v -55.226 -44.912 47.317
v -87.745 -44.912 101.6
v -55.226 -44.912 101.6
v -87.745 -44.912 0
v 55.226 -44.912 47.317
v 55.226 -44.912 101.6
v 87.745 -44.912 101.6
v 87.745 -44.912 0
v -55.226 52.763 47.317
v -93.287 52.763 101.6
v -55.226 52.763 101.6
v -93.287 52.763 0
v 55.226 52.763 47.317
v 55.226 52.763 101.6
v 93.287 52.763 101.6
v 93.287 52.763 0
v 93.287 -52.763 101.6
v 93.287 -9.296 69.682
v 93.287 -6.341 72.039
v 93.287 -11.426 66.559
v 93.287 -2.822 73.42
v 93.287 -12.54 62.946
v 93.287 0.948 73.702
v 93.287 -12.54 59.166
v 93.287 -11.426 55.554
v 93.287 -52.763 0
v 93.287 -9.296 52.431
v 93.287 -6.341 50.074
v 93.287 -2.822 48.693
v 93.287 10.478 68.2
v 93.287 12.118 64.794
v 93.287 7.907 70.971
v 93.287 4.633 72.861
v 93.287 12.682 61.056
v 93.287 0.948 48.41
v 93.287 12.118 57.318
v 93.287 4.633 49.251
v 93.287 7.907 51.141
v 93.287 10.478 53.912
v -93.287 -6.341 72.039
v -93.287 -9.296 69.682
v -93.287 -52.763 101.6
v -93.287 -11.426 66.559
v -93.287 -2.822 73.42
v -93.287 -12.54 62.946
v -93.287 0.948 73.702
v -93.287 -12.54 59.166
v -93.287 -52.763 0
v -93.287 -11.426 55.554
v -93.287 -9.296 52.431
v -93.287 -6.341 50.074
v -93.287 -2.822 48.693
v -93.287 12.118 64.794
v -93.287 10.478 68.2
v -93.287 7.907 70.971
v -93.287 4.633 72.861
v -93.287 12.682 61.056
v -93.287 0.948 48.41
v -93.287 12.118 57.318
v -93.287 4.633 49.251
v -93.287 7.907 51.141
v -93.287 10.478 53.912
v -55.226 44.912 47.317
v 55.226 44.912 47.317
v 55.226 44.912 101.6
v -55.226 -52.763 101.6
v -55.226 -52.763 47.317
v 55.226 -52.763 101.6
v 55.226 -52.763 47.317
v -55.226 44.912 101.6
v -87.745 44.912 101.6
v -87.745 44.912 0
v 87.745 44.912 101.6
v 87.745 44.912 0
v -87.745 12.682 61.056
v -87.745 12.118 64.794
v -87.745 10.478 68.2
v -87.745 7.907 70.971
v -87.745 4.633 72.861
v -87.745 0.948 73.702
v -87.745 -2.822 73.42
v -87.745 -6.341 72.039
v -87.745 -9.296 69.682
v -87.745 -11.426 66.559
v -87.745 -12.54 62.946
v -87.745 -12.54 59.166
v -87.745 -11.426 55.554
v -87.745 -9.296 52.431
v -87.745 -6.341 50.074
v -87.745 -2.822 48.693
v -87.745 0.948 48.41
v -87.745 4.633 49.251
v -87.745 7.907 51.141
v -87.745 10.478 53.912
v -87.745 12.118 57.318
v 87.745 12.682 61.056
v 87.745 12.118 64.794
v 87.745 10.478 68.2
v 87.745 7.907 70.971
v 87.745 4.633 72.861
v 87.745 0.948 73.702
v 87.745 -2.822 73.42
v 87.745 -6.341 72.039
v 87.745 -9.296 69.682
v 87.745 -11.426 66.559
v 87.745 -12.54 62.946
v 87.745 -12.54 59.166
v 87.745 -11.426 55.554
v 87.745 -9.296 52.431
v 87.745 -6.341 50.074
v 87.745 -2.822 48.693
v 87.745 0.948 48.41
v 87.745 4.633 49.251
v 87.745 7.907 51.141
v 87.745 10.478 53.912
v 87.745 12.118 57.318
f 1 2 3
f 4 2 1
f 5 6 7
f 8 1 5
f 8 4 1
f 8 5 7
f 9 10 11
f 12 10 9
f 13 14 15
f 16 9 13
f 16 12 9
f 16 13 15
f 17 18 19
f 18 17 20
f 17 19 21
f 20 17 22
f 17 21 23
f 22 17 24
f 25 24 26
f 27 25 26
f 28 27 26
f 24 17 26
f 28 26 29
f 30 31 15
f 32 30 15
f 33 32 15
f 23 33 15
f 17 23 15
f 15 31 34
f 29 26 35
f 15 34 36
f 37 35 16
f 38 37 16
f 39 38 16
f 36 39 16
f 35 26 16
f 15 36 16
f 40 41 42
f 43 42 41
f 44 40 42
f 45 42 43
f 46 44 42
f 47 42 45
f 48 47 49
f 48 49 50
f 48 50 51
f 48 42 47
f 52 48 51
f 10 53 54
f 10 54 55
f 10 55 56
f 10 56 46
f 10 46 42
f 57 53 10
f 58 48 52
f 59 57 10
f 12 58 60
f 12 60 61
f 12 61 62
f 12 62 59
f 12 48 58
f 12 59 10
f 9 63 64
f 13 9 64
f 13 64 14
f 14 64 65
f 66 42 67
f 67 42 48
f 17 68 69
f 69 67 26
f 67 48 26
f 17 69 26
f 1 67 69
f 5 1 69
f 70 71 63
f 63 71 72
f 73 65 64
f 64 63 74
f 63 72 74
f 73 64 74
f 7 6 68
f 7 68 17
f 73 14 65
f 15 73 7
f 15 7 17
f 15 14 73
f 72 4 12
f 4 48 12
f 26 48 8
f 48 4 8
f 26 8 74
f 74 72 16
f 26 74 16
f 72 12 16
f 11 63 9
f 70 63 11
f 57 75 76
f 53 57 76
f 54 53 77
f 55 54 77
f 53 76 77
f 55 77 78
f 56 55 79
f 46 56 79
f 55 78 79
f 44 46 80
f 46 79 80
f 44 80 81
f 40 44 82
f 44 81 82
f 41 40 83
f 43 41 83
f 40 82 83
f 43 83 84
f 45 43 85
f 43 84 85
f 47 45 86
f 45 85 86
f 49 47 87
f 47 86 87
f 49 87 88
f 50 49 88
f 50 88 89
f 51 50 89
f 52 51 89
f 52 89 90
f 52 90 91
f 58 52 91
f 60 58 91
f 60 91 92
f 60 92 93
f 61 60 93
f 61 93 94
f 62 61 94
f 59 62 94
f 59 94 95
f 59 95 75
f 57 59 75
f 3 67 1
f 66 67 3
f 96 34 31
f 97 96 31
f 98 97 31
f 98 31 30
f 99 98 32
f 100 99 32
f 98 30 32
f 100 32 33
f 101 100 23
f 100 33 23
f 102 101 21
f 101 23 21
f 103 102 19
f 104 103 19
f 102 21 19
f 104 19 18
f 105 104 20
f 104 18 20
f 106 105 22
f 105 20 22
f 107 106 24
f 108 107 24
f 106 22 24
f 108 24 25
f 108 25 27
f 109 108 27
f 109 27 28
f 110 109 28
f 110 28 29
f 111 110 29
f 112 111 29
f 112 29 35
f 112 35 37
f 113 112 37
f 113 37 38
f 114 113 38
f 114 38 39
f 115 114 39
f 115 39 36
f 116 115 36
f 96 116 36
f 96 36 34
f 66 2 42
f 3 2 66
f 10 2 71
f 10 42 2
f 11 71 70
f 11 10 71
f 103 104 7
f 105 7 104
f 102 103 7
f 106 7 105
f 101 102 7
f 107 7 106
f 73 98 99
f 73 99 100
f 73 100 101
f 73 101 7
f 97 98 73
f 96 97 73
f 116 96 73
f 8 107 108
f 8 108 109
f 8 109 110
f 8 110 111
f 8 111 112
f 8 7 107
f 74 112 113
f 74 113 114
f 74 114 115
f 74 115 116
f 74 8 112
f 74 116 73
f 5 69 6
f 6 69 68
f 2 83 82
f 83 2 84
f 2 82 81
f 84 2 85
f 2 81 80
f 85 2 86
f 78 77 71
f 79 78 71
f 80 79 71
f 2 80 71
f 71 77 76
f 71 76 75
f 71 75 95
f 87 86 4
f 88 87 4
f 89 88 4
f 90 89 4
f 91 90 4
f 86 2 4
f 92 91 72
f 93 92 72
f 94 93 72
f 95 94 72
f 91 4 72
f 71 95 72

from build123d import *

# Parameters (mm, degrees)
F0_W     = 186.574548
F0_H     = 105.525456
F0_W_2   = 175.490916
F0_H_2   = 89.82364
F1_DEPTH = 101.6
F2_W     = 110.451512
F2_H     = 55.495151
F3_DEPTH = 115.824
F4_R     = 12.681558
F5_DEPTH = 207.264


with BuildPart() as f1:
    # F0 (on Top) → F1 (new body)
    with BuildSketch(Plane.XY):
        Rectangle(F0_W, F0_H)
        Rectangle(F0_W_2, F0_H_2, mode=Mode.SUBTRACT)
    extrude(amount=F1_DEPTH)

    # F2 (on face) → F3 (cut)
    with BuildSketch(Plane.XZ.offset(52.762728)):
        with Locations((0, 75.064696)):
            Rectangle(F2_W, F2_H)
    extrude(amount=-F3_DEPTH, mode=Mode.SUBTRACT)

    # F4 (on face) → F5 (cut)
    with BuildSketch(Plane.YZ.offset(93.287274)):
        with Locations((0, 61.056208)):
            Circle(F4_R)
    extrude(amount=-F5_DEPTH, mode=Mode.SUBTRACT)


solid = f1.part
